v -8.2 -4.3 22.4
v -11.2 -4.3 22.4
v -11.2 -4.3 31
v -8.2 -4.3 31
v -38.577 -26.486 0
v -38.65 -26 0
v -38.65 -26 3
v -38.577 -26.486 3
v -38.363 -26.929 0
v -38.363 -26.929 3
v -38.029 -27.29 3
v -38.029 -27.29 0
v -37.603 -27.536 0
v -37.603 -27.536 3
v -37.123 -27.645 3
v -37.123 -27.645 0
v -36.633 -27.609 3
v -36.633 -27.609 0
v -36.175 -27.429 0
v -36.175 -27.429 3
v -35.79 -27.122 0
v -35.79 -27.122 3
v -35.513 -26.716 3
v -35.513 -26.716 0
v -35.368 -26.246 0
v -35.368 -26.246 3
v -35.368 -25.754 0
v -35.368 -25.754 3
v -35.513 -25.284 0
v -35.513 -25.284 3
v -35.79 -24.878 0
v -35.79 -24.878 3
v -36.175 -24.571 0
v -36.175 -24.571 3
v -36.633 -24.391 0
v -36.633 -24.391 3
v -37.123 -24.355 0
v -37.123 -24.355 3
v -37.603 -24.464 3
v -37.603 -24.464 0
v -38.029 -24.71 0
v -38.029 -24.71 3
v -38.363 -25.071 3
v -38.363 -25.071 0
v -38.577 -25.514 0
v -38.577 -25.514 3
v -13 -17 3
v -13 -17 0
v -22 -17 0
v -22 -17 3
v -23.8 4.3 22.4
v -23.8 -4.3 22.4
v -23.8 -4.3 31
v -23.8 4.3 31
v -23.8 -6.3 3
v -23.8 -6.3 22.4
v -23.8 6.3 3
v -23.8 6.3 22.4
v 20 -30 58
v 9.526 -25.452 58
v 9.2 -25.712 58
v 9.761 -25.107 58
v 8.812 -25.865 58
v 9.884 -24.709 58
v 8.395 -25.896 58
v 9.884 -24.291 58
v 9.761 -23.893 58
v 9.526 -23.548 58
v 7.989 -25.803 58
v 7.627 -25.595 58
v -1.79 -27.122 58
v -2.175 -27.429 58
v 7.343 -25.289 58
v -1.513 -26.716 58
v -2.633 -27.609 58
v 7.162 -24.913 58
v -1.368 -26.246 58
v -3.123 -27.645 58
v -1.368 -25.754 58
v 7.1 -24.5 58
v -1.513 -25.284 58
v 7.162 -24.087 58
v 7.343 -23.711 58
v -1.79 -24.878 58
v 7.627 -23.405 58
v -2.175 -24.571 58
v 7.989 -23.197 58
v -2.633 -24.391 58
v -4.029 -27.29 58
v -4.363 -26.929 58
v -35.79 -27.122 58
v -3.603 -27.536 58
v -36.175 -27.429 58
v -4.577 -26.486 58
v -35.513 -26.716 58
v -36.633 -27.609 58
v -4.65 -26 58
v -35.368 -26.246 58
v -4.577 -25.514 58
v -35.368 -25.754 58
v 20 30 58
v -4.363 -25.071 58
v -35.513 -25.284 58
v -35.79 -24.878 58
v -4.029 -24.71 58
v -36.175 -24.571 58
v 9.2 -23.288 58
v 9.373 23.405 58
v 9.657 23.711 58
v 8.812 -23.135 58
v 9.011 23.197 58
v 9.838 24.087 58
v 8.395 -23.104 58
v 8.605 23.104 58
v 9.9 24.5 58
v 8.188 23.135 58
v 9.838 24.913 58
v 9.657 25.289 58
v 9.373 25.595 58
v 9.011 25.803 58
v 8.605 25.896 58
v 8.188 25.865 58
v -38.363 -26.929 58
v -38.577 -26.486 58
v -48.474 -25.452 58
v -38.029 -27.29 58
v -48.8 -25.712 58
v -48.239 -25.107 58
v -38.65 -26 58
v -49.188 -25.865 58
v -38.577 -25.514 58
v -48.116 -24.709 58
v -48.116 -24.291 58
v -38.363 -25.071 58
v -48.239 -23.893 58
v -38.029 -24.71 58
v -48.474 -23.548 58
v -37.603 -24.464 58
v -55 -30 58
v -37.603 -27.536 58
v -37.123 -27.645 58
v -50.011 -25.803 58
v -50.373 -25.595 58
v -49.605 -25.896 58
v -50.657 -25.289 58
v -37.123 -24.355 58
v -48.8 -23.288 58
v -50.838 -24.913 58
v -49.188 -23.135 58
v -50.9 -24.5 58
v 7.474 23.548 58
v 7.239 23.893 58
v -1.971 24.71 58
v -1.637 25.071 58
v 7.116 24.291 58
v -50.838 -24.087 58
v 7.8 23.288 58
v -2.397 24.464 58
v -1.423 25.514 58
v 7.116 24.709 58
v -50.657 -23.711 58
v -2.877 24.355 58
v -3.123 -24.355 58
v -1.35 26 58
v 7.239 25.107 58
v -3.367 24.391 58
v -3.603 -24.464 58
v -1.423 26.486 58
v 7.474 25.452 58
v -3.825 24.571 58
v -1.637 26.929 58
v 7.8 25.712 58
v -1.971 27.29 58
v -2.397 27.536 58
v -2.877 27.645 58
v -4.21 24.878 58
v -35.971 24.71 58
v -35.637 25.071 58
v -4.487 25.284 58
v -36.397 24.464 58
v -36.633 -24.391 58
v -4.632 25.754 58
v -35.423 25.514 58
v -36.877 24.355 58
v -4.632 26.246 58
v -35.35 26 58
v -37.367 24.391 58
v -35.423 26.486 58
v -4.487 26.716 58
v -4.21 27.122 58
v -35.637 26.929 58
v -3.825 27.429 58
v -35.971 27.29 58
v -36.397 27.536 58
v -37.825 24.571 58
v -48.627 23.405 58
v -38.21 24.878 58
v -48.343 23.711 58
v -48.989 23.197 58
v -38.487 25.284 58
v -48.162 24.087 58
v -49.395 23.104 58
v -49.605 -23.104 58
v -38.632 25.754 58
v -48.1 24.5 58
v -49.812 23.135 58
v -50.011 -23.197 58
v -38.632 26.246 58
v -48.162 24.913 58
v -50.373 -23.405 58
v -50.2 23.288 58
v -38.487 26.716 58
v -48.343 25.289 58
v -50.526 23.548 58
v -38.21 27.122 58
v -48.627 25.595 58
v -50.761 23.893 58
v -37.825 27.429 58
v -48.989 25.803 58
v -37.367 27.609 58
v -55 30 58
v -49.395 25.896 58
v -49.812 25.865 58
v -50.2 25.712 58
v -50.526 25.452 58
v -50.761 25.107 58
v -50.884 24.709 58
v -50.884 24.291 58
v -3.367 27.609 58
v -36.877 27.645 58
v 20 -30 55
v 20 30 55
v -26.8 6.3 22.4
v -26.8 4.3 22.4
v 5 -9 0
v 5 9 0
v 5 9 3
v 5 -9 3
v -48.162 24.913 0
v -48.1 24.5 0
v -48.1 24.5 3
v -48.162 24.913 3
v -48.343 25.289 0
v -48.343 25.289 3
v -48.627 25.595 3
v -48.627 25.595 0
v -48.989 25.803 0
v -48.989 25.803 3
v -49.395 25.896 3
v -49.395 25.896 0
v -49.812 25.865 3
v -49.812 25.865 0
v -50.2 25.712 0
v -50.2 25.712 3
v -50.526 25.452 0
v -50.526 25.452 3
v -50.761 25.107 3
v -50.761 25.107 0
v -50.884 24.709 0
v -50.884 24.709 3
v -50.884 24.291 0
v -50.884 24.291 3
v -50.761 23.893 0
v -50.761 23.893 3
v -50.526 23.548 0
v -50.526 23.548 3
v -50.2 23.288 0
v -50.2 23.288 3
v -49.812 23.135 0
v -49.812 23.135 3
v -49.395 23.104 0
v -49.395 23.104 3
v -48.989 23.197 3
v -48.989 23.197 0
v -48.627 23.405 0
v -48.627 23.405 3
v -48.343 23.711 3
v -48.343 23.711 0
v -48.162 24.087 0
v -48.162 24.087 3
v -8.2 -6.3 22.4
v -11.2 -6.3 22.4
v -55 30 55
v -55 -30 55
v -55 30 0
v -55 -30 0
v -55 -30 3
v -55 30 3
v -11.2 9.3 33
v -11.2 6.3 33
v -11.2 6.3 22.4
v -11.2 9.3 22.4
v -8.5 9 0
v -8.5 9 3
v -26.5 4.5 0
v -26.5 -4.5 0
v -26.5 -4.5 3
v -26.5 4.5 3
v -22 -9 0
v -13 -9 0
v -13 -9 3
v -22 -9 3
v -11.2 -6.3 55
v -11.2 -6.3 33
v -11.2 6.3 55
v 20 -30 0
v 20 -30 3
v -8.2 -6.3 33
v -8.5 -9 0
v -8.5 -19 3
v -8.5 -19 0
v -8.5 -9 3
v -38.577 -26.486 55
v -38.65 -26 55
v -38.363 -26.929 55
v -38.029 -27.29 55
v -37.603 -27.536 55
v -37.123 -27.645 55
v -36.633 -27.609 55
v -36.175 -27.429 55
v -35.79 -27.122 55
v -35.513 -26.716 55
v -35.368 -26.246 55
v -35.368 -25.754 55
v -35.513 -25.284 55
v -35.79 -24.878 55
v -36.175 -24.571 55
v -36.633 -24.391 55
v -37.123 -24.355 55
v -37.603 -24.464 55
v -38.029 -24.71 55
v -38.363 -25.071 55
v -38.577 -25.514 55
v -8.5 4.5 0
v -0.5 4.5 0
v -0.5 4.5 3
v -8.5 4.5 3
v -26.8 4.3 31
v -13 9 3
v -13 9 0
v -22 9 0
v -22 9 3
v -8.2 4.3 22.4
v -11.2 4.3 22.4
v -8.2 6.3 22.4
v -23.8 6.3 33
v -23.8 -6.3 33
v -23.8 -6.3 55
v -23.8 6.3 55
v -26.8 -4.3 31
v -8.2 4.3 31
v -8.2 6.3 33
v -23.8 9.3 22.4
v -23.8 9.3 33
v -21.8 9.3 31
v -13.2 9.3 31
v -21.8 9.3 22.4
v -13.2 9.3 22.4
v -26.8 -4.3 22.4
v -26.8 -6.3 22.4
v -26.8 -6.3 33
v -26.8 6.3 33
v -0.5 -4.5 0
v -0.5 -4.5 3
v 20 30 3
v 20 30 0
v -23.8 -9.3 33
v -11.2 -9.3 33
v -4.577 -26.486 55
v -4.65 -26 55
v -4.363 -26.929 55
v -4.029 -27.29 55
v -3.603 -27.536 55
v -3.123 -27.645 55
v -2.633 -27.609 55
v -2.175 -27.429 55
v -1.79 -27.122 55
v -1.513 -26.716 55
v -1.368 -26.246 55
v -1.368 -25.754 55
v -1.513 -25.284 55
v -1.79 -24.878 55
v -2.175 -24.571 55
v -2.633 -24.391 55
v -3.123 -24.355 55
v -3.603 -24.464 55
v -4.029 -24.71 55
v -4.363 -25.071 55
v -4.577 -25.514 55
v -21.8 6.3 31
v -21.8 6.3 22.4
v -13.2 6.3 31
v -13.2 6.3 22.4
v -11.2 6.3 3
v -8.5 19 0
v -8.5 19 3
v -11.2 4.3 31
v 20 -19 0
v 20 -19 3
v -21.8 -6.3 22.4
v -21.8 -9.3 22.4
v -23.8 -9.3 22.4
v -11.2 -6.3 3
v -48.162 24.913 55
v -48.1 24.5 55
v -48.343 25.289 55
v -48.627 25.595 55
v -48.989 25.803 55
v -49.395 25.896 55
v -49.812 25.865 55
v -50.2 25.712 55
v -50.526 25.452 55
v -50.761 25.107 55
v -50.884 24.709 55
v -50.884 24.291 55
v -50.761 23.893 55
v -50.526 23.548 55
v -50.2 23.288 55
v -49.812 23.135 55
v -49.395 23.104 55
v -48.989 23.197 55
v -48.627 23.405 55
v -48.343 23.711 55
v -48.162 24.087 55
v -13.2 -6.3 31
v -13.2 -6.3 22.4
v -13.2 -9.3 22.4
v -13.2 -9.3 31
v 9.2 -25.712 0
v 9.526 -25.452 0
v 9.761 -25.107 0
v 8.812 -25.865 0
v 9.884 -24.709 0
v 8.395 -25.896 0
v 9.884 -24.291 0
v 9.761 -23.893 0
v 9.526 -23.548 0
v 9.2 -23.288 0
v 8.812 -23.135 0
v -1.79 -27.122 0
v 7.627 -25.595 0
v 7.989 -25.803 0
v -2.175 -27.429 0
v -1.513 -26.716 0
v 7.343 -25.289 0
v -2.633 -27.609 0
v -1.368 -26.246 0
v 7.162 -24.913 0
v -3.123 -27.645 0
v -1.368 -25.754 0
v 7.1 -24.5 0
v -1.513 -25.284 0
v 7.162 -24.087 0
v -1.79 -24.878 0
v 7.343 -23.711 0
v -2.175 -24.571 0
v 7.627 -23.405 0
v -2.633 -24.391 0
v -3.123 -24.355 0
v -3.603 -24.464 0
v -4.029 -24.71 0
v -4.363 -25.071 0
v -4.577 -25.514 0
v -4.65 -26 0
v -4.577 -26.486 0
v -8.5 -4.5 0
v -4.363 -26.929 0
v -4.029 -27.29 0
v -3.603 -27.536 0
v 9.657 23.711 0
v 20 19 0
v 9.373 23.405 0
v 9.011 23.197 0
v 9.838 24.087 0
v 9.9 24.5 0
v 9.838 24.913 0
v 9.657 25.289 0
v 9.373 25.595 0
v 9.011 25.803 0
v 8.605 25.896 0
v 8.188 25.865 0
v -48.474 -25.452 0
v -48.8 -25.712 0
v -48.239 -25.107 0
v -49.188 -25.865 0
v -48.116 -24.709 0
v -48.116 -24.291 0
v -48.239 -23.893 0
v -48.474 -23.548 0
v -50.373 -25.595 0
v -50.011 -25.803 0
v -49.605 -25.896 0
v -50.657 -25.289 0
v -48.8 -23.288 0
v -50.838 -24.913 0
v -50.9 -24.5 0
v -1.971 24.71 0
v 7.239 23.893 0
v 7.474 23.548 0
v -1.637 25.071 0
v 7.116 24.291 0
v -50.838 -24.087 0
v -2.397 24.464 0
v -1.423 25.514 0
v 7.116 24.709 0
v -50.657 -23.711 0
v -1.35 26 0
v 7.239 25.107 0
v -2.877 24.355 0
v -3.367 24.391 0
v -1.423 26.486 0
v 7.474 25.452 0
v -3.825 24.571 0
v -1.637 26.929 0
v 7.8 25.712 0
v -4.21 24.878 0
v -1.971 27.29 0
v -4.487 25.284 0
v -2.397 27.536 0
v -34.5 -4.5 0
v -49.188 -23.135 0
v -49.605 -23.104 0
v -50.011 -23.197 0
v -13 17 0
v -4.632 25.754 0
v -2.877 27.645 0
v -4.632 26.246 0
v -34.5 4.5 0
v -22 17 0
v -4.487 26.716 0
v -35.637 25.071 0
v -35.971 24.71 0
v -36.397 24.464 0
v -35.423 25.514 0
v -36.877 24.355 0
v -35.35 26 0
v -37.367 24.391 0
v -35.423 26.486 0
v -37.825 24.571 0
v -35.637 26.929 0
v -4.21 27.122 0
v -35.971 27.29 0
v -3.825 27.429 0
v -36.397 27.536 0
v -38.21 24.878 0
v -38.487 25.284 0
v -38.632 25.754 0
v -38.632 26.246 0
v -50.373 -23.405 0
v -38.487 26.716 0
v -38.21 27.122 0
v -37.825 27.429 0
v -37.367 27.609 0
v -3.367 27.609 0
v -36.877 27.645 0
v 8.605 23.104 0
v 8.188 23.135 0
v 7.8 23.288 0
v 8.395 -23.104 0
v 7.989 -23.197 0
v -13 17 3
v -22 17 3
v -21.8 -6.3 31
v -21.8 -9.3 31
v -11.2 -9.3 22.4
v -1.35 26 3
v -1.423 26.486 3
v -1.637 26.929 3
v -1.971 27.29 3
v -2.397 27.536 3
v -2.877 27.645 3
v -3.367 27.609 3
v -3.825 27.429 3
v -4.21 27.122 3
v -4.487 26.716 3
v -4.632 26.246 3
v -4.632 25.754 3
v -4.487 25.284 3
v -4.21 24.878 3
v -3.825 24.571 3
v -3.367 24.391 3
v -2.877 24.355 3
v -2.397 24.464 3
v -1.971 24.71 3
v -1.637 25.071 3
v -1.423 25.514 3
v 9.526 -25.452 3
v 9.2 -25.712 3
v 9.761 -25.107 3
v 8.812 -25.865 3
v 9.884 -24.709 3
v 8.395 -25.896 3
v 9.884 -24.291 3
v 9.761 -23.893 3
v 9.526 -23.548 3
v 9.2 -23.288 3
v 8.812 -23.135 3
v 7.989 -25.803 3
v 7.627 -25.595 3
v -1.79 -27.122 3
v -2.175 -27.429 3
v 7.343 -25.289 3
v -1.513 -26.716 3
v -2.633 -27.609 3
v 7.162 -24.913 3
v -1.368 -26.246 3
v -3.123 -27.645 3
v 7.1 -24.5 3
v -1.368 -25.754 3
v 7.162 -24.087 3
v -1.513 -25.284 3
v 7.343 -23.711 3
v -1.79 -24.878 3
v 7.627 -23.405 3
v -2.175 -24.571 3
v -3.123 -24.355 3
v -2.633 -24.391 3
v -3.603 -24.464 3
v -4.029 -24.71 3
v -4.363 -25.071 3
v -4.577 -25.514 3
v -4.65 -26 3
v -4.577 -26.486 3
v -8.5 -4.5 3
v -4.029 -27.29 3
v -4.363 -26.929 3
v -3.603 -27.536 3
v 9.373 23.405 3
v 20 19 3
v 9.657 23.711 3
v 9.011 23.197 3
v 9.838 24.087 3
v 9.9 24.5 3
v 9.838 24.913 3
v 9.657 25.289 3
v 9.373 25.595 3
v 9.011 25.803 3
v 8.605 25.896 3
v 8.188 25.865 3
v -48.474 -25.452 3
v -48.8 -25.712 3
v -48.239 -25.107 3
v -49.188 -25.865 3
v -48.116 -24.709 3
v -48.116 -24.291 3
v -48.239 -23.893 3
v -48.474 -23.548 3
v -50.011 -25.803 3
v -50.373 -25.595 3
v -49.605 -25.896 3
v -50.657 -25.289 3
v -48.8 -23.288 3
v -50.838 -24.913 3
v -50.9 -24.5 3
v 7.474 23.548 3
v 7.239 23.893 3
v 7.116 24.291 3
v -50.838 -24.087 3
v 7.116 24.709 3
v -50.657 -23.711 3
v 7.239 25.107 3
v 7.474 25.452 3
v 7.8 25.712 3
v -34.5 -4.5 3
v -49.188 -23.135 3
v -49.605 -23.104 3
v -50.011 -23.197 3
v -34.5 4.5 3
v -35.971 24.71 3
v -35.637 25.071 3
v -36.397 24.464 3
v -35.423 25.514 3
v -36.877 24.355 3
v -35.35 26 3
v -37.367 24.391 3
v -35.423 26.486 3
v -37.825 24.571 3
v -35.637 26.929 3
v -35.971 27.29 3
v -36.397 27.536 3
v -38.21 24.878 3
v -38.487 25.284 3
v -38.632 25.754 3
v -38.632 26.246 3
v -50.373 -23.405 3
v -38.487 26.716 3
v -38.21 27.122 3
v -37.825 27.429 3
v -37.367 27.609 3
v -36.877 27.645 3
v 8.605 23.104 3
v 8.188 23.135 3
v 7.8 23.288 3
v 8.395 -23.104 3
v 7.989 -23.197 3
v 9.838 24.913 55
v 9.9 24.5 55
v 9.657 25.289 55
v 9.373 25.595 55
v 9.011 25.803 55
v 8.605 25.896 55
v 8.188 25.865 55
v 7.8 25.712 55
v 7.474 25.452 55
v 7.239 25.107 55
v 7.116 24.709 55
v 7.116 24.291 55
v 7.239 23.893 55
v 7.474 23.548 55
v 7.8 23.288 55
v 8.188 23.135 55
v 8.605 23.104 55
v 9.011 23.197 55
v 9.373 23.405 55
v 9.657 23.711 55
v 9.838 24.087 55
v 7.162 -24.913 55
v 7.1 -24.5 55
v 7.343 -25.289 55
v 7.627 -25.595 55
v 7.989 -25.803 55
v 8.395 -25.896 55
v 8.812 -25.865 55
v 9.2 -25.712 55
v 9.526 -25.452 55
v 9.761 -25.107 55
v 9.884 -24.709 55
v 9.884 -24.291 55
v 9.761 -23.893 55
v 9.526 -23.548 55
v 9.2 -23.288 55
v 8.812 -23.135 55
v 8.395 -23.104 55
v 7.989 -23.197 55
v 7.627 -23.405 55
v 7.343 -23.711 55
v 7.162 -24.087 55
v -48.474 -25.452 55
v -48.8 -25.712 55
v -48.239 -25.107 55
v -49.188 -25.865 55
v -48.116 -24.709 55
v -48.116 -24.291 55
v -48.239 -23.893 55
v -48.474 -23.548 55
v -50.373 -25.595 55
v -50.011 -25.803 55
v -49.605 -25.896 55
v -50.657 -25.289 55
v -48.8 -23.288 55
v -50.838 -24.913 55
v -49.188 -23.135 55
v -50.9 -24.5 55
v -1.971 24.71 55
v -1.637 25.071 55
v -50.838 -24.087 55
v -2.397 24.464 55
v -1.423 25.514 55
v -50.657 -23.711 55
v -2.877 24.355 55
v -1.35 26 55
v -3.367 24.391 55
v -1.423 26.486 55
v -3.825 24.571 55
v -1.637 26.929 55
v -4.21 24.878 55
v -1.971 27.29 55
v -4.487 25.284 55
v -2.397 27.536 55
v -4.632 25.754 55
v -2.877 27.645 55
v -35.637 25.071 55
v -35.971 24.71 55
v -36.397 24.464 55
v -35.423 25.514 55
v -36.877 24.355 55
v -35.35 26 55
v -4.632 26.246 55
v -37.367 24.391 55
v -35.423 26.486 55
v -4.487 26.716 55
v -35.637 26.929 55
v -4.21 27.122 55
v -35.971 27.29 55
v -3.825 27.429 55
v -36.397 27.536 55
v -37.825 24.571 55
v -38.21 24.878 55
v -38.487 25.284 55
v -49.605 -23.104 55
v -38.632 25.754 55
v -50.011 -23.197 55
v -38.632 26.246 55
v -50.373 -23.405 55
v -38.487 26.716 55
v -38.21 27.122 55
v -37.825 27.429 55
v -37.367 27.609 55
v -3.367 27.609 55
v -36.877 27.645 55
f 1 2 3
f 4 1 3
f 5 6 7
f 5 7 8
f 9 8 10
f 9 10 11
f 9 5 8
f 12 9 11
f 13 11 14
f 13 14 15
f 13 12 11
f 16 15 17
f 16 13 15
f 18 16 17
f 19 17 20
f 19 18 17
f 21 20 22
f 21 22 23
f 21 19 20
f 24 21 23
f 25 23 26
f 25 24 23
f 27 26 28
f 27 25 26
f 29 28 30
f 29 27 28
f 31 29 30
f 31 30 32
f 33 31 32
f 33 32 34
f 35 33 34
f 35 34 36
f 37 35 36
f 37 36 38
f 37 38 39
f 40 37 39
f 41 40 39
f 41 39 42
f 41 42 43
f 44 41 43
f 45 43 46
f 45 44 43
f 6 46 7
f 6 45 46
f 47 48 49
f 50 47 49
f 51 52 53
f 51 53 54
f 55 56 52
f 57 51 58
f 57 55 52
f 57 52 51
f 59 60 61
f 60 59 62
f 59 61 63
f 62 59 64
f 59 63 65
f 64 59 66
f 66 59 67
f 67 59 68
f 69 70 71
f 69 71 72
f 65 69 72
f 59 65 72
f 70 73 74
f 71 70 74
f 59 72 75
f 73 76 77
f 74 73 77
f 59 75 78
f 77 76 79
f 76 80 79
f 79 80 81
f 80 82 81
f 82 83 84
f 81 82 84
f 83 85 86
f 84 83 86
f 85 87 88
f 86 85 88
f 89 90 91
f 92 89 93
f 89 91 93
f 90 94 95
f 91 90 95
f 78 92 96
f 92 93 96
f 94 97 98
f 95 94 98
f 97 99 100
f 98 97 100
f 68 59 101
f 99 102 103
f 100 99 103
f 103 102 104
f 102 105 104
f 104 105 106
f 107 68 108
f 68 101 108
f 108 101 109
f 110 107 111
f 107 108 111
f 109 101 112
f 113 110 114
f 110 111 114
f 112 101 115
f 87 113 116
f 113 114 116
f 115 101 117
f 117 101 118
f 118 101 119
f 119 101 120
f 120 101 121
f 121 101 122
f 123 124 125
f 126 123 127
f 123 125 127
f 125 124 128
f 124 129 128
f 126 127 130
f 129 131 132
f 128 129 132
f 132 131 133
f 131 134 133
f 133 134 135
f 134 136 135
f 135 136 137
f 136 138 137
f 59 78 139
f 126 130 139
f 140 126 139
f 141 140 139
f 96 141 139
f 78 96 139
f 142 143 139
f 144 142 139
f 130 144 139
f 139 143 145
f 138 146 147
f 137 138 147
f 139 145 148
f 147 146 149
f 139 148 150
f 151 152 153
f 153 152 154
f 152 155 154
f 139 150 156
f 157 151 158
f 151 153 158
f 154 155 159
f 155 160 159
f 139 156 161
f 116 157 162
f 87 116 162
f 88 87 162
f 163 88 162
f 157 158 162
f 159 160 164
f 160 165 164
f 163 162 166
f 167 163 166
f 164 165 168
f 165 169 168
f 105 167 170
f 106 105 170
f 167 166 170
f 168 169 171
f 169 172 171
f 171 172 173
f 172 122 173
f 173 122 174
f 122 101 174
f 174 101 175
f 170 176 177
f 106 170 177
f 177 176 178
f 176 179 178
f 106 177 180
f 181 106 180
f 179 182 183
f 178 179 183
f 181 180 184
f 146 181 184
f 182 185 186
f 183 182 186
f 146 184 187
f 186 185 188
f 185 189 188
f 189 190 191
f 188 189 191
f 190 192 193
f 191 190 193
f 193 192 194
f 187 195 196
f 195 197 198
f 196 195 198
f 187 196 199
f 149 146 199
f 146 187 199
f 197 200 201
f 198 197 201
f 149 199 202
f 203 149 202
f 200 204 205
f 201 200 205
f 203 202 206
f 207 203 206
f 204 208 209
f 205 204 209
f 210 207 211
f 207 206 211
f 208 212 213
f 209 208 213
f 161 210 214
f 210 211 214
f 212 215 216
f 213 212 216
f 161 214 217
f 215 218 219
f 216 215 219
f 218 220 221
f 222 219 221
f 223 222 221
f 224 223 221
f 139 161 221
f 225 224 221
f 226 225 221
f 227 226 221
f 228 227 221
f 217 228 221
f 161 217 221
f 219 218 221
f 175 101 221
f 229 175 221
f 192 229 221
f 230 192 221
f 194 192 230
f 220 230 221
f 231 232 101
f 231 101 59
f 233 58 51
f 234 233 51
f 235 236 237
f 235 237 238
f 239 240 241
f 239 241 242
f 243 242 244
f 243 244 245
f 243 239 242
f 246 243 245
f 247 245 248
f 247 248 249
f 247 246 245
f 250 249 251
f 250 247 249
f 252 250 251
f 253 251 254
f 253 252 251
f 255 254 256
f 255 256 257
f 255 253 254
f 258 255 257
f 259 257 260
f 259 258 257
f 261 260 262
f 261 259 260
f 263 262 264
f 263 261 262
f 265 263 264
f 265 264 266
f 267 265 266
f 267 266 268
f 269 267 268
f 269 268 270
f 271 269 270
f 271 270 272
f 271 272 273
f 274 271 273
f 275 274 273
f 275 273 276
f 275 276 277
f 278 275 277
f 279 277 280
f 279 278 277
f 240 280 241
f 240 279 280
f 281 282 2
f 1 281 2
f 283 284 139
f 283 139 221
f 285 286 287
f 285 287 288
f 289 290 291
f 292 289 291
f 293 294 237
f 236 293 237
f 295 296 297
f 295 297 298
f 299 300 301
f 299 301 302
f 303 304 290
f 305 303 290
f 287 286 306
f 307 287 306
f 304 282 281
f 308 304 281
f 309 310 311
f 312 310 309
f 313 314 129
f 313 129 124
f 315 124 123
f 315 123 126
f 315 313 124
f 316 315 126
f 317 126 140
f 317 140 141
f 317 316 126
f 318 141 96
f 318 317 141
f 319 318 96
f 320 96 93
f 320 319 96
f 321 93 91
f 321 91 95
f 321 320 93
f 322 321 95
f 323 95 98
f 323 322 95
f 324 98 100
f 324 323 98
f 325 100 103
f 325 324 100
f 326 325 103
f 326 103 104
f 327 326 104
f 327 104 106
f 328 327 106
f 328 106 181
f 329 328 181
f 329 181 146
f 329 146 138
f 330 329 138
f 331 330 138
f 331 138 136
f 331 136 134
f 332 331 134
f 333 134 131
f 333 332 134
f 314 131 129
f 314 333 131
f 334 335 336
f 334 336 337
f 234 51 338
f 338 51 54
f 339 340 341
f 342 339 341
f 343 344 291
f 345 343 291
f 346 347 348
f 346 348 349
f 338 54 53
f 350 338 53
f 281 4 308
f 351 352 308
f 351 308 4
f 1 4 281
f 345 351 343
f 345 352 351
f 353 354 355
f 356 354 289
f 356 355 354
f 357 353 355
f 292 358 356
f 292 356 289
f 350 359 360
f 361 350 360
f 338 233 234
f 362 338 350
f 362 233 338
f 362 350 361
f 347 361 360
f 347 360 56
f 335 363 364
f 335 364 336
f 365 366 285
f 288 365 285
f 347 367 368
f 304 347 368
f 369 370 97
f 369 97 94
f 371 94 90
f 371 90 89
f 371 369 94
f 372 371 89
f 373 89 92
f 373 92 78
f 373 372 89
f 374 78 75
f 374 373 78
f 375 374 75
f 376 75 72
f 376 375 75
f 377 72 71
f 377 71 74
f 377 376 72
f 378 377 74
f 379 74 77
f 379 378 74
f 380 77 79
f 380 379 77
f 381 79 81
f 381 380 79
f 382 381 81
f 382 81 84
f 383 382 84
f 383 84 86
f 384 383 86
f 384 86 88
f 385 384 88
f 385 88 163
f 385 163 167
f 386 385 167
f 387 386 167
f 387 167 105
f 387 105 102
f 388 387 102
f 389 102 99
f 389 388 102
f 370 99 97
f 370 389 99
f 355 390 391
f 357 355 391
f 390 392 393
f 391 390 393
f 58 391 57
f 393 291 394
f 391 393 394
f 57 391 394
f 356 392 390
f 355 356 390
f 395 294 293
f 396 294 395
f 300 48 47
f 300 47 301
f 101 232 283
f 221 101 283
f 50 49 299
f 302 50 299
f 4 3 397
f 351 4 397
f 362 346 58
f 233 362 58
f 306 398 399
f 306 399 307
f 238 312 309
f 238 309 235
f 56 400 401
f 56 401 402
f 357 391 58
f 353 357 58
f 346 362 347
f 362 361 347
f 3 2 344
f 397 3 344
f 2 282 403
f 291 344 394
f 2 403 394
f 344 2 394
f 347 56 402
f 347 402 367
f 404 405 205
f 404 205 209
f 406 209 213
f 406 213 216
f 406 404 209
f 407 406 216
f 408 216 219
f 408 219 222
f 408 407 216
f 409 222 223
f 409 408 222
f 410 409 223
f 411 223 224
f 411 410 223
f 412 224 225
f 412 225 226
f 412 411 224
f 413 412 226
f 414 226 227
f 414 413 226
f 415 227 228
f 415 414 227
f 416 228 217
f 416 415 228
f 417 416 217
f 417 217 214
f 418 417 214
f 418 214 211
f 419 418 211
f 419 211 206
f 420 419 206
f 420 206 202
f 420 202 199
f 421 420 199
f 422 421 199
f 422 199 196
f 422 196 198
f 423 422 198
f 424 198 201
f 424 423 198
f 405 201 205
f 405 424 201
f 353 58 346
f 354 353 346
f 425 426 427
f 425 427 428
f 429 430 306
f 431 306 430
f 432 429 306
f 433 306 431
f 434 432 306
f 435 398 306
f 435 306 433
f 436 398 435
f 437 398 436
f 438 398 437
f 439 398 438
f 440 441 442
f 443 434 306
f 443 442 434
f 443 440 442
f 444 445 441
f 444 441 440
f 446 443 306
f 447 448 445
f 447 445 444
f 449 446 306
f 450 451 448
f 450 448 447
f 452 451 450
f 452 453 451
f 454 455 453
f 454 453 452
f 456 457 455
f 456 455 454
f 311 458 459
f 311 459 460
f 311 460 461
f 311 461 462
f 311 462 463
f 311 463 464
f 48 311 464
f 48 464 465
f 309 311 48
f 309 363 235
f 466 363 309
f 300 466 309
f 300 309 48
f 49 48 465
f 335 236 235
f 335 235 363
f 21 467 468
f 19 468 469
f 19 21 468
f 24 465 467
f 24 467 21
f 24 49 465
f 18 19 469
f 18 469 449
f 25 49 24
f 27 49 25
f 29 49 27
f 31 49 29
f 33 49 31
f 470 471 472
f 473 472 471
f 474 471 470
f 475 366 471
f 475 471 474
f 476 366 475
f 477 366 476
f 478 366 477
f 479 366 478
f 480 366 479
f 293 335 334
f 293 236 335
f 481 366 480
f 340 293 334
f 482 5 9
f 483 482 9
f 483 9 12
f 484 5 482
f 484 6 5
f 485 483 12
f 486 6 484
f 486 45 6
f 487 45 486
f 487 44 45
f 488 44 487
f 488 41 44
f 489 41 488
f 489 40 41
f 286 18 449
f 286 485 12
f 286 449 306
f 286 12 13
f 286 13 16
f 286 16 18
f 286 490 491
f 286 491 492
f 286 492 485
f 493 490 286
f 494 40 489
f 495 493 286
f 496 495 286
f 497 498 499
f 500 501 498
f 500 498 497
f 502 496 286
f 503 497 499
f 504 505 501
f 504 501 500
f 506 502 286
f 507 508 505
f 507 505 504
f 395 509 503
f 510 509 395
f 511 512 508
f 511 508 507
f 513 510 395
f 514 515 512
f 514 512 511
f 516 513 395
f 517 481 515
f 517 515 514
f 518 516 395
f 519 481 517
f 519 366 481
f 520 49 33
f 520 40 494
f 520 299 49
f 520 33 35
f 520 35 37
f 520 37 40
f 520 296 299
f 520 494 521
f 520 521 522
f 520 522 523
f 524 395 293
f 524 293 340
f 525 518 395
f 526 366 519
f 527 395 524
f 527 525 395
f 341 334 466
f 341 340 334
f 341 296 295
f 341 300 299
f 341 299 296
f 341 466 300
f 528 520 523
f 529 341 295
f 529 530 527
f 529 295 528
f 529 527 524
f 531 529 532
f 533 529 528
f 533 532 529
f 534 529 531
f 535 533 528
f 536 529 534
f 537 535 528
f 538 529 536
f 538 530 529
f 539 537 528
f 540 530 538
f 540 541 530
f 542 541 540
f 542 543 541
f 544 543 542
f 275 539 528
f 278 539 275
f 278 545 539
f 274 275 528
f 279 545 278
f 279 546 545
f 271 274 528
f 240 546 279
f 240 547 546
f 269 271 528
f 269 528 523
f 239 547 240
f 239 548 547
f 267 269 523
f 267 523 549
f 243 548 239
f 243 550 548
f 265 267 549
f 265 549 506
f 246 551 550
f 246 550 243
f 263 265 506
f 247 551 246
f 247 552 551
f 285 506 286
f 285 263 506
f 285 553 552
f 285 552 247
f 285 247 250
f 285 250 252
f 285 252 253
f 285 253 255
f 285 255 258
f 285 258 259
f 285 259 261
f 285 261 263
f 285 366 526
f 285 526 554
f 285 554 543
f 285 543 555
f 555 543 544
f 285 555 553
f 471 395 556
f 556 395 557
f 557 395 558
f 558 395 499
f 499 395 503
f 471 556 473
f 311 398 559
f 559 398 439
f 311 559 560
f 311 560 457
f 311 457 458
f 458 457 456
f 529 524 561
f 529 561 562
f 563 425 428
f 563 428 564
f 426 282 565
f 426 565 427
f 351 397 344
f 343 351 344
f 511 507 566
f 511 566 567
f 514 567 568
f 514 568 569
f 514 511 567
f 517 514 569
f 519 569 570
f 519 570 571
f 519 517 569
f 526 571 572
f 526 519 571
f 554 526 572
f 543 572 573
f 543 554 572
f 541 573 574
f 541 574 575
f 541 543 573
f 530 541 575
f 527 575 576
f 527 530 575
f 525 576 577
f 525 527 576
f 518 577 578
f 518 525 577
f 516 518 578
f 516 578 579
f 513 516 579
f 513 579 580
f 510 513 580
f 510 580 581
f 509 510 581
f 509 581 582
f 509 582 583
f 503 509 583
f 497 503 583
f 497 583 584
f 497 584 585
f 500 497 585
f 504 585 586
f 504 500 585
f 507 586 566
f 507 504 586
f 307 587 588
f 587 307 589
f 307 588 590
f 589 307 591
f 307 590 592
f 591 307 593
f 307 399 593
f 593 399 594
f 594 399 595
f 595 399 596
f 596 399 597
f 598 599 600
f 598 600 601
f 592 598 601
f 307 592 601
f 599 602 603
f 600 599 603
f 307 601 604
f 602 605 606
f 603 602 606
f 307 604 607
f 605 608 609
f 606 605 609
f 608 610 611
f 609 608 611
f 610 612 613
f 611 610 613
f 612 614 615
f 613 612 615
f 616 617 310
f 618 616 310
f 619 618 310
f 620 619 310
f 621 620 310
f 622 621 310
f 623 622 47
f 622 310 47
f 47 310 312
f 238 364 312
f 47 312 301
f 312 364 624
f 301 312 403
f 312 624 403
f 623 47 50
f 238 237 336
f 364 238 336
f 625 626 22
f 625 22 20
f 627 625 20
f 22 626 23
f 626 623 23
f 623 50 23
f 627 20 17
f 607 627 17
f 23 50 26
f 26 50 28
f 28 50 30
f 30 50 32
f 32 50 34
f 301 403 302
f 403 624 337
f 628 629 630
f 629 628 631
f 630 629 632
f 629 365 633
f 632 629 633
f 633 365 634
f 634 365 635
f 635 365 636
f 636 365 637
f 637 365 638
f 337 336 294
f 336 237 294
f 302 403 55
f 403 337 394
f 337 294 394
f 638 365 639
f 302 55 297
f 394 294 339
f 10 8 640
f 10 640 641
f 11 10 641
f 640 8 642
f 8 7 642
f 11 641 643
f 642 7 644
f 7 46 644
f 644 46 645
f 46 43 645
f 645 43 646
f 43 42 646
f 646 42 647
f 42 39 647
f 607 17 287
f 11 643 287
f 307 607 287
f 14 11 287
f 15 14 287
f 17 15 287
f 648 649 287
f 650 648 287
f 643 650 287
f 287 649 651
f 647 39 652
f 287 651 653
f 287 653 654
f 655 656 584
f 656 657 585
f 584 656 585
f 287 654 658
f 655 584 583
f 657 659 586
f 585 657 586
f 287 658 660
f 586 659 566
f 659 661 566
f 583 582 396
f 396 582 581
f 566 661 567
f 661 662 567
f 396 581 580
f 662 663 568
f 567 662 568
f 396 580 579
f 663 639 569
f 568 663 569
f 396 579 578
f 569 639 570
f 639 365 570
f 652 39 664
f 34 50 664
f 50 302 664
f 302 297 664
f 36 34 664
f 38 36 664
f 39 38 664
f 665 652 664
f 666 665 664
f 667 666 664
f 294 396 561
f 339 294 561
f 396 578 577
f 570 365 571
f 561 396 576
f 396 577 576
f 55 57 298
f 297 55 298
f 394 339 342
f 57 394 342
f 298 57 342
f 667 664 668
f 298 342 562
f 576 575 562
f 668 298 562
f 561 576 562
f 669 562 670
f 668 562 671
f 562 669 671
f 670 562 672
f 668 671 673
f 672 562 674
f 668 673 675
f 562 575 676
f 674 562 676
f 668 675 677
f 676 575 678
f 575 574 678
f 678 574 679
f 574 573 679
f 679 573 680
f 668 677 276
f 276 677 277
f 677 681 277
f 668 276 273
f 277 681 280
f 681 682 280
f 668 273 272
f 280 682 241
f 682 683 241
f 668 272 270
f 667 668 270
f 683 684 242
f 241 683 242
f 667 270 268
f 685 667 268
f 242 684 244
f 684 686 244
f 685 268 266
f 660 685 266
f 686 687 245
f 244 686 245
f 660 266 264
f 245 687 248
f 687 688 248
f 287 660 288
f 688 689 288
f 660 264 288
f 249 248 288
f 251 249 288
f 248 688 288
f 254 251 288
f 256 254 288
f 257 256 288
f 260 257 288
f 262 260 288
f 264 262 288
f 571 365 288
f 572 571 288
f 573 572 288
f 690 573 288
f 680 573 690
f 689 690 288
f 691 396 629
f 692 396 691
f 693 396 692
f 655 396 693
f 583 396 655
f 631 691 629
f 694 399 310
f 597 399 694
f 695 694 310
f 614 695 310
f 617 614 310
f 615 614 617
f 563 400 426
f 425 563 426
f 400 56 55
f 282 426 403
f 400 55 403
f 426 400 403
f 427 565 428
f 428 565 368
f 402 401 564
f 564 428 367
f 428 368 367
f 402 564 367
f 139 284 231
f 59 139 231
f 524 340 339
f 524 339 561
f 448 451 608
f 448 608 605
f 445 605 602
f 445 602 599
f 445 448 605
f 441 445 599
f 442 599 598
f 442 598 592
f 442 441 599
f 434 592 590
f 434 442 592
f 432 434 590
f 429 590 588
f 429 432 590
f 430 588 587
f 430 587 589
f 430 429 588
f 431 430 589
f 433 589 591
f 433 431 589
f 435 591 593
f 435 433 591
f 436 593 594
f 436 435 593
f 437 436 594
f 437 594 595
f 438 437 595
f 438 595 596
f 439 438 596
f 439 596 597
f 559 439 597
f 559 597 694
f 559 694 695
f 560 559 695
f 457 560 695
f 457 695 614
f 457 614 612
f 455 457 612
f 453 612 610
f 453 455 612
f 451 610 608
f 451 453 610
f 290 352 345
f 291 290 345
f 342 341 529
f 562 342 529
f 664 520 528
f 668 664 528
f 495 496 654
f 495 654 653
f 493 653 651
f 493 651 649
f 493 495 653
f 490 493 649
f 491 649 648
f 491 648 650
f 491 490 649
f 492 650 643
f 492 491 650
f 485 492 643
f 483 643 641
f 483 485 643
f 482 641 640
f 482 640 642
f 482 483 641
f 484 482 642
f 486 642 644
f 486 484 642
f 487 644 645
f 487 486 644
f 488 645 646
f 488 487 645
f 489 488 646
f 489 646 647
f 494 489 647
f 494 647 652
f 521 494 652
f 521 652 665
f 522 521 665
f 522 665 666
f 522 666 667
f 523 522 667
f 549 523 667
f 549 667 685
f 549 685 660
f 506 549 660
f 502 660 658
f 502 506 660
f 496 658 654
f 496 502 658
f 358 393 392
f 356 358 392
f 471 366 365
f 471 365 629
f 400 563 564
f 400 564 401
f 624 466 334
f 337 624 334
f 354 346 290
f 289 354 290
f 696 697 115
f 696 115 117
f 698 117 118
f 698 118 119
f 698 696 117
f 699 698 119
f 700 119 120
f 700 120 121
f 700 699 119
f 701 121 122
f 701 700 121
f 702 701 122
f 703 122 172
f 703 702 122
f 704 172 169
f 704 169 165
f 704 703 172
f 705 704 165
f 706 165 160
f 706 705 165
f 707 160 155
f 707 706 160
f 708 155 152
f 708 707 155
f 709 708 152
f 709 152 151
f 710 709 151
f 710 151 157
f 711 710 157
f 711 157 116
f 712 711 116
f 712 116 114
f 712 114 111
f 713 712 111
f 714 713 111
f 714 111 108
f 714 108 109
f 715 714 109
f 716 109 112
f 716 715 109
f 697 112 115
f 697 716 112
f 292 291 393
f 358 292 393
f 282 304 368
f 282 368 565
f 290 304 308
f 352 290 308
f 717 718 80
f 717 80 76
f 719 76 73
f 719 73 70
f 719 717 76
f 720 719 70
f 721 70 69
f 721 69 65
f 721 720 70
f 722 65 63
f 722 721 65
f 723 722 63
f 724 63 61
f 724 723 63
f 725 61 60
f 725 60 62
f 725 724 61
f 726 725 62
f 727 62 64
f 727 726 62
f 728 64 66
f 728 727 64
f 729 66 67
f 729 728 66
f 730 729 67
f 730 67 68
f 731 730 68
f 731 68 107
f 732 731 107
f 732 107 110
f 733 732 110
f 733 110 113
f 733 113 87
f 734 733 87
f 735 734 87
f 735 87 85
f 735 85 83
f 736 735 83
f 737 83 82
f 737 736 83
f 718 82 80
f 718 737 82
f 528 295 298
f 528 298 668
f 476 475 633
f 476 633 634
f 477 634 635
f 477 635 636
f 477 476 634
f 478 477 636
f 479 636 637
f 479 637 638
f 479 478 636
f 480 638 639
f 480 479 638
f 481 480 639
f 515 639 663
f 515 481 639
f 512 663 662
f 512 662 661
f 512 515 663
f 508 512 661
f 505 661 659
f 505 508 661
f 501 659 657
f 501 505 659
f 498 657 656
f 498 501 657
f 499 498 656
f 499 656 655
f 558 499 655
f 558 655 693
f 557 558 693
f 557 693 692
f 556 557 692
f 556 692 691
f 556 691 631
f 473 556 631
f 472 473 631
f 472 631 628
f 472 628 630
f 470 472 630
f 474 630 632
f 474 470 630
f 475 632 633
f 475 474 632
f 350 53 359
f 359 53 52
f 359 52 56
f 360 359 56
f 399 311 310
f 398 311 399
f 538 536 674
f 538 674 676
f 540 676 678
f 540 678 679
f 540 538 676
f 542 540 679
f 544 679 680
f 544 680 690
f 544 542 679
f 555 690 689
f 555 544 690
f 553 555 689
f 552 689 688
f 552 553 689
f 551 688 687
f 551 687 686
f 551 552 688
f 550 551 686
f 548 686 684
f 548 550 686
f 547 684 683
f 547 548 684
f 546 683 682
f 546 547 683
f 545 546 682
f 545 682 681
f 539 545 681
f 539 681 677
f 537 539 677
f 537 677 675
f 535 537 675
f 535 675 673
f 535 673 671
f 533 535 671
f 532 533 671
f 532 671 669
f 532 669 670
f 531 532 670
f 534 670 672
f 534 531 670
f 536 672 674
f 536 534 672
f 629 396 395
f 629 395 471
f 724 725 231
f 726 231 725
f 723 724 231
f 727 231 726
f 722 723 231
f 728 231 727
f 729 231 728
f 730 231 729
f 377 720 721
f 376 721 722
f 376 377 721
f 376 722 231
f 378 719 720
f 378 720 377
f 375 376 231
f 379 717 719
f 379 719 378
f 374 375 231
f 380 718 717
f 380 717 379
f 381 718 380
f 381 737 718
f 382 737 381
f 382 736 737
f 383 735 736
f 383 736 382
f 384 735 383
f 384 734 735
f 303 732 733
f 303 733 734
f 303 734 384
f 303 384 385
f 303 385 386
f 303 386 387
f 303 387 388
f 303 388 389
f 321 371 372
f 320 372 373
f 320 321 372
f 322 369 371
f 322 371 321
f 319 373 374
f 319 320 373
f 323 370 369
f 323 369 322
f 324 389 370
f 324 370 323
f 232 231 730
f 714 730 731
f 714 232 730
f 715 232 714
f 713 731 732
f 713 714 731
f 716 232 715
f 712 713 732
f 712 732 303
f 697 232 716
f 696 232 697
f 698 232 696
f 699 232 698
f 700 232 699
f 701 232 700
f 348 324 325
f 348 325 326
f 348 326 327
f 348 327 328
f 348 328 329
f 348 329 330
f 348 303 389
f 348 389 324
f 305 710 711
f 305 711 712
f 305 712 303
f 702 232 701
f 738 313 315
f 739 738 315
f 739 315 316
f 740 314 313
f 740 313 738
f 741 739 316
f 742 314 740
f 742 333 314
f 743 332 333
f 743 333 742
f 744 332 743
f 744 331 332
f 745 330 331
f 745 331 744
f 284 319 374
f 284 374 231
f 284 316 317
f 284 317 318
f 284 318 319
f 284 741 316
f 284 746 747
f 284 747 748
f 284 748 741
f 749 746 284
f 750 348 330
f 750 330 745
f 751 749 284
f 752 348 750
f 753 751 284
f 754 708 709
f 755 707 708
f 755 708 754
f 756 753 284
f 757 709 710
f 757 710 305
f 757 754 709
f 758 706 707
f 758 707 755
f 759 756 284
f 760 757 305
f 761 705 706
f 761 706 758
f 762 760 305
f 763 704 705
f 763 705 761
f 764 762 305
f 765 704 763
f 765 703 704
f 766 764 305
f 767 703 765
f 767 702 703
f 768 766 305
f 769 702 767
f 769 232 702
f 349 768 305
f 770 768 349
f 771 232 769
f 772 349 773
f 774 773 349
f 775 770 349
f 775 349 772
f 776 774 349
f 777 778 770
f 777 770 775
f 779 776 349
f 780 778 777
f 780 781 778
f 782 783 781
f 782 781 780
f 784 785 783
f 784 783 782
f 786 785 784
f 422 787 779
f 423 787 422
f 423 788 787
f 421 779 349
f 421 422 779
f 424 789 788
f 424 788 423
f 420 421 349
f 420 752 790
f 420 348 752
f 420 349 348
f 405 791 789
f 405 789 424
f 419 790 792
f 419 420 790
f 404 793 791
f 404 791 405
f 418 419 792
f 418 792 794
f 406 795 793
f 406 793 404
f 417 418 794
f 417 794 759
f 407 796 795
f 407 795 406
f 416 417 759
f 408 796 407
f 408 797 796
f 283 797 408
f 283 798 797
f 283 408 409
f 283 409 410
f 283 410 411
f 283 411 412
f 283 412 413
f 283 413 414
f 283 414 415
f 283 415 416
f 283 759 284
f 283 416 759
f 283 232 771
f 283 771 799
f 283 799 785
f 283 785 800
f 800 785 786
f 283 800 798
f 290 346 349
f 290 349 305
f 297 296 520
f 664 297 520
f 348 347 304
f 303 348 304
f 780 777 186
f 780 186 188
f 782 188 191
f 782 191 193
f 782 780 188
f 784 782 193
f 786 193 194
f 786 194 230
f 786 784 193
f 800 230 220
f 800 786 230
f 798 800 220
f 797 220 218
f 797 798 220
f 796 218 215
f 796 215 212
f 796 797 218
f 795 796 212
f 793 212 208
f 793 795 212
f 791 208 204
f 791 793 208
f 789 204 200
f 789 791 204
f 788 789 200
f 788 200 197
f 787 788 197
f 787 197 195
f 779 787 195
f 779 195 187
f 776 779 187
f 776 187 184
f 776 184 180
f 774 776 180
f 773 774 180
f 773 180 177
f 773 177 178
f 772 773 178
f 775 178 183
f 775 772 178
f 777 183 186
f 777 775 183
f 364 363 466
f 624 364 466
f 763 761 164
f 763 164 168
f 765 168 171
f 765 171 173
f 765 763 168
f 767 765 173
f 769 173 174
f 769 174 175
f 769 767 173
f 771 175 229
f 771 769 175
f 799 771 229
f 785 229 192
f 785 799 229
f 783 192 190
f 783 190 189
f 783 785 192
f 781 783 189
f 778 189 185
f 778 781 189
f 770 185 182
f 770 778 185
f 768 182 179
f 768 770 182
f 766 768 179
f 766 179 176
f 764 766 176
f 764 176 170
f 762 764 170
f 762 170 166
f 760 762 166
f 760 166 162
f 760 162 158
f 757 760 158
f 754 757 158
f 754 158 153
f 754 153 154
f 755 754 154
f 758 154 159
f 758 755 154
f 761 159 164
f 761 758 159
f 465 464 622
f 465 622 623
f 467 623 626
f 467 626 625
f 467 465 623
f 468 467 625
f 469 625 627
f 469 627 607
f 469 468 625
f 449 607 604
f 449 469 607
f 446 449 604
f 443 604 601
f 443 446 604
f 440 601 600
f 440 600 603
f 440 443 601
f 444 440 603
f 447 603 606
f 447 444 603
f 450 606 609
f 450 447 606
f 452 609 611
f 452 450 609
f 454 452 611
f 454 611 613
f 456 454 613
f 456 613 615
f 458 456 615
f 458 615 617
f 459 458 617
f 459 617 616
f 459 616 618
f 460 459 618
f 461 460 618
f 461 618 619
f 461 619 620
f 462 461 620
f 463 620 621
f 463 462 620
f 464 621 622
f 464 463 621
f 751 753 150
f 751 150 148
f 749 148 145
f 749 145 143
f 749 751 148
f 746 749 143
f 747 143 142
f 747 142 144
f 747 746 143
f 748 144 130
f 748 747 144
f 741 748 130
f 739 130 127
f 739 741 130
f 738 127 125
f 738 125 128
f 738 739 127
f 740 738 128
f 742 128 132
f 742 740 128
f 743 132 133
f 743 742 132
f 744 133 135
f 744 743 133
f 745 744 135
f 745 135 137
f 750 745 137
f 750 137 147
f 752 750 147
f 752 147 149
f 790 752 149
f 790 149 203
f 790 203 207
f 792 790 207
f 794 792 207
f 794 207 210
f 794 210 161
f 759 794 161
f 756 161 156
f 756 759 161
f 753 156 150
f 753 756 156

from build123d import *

# Parameters (mm, degrees)
SKETCH_4_R          = 1.4
SKETCH_4_R_2        = 1.65
EXTRUDE_1_DEPTH     = 3
SKETCH_5_W          = 12.6
SKETCH_5_H          = 12.6
EXTRUDE_2_DEPTH     = 30
SKETCH_6_W          = 9
SKETCH_6_H          = 8
SKETCH_6_W_2        = 8
SKETCH_6_H_2        = 9
CUT_EXTRUDE_2_DEPTH = 71.809603868
EXTRUDE_3_DEPTH     = 3
EXTRUDE_4_DEPTH     = 3
EXTRUDE_5_DEPTH     = 3
EXTRUDE_6_DEPTH     = 3
SKETCH_13_W         = 12.6
SKETCH_13_H         = 12.6
EXTRUDE_7_DEPTH     = 22
SKETCH_14_R         = 1.4
SKETCH_14_R_2       = 1.65
EXTRUDE_8_DEPTH     = 3
SKETCH_15_W         = 13.5
SKETCH_15_H         = 10
CUT_EXTRUDE_3_DEPTH = 84.366660003


with BuildPart() as part:
    # 草图4 → 凸台-拉伸1 (new body)
    with BuildSketch(Plane.XY):
        Polygon((-39, 30), (20, 30), (20, 19), (5, 19), (5, -19), (20, -19), (20, -30), (-39, -30), (-55, -30), (-55, 30), align=None)
        with Locations((-49.5, 24.5)):
            Circle(SKETCH_4_R, mode=Mode.SUBTRACT)
        with Locations((8.5, 24.5)):
            Circle(SKETCH_4_R, mode=Mode.SUBTRACT)
        with Locations((-3, 26)):
            Circle(SKETCH_4_R_2, mode=Mode.SUBTRACT)
        with Locations((-37, 26)):
            Circle(SKETCH_4_R_2, mode=Mode.SUBTRACT)
        with Locations(Location((-37, -26, 0), (0, 0, 180))):
            Circle(SKETCH_4_R_2, mode=Mode.SUBTRACT)
        with Locations(Location((-3, -26, 0), (0, 0, 180))):
            Circle(SKETCH_4_R_2, mode=Mode.SUBTRACT)
        with Locations(Location((8.5, -24.5, 0), (0, 0, 180))):
            Circle(SKETCH_4_R, mode=Mode.SUBTRACT)
        with Locations(Location((-49.5, -24.5, 0), (0, 0, 180))):
            Circle(SKETCH_4_R, mode=Mode.SUBTRACT)
    extrude(amount=EXTRUDE_1_DEPTH)

    # 草图5 → 凸台-拉伸2 (add)
    with BuildSketch(Plane.XY.offset(3)):
        with Locations((-17.5, 0)):
            Rectangle(SKETCH_5_W, SKETCH_5_H)
    extrude(amount=EXTRUDE_2_DEPTH)

    # 草图6 → 切除-拉伸2 (cut, through all)
    with BuildSketch(Plane(origin=(0, 0, 0), x_dir=(-1, 0, 0), z_dir=(0, 0, -1))):
        with Locations((17.5, 13)):
            Rectangle(SKETCH_6_W, SKETCH_6_H)
        with Locations((30.5, 0)):
            Rectangle(SKETCH_6_W_2, SKETCH_6_H_2)
        with Locations((17.5, -13)):
            Rectangle(SKETCH_6_W, SKETCH_6_H)
        with Locations((4.5, 0)):
            Rectangle(SKETCH_6_W_2, SKETCH_6_H_2)
    extrude(amount=-CUT_EXTRUDE_2_DEPTH, mode=Mode.SUBTRACT)

    # 草图8 → 凸台-拉伸3 (add)
    with BuildSketch(Plane(origin=(-11.2, 0, 0), x_dir=(0, 0, -1), z_dir=(1, 0, 0))):
        Polygon((-31, 4.3), (-22.4, 4.3), (-22.4, 6.3), (-33, 6.3), (-33, -6.3), (-22.4, -6.3), (-22.4, -4.3), (-31, -4.3), align=None)
    extrude(amount=EXTRUDE_3_DEPTH)

    # 草图10 → 凸台-拉伸4 (add)
    with BuildSketch(Plane.ZY.offset(23.8)):
        Polygon((22.4, 6.3), (22.4, 4.3), (31, 4.3), (31, -4.3), (22.4, -4.3), (22.4, -6.3), (33, -6.3), (33, 6.3), align=None)
    extrude(amount=EXTRUDE_4_DEPTH)

    # 草图11 → 凸台-拉伸5 (add)
    with BuildSketch(Plane.XZ.offset(6.3)):
        Polygon((-23.8, 22.4), (-23.8, 33), (-11.2, 33), (-11.2, 22.4), (-13.2, 22.4), (-13.2, 31), (-21.8, 31), (-21.8, 22.4), align=None)
    extrude(amount=EXTRUDE_5_DEPTH)

    # 草图12 → 凸台-拉伸6 (add)
    with BuildSketch(Plane(origin=(0, 6.3, 0), x_dir=(1, 0, 0), z_dir=(0, 1, 0))):
        Polygon((-23.8, -22.4), (-23.8, -33), (-11.2, -33), (-11.2, -22.4), (-13.2, -22.4), (-13.2, -31), (-21.8, -31), (-21.8, -22.4), align=None)
    extrude(amount=EXTRUDE_6_DEPTH)

    # 草图13 → 凸台-拉伸7 (add)
    with BuildSketch(Plane.XY.offset(33)):
        with Locations((-17.5, 0)):
            Rectangle(SKETCH_13_W, SKETCH_13_H)
    extrude(amount=EXTRUDE_7_DEPTH)

    # 草图14 → 凸台-拉伸8 (add)
    with BuildSketch(Plane.XY.offset(55)):
        Polygon((-39, 30), (20, 30), (20, -30), (-39, -30), (-55, -30), (-55, 30), align=None)
        with Locations((-49.5, 24.5)):
            Circle(SKETCH_14_R, mode=Mode.SUBTRACT)
        with Locations((8.5, 24.5)):
            Circle(SKETCH_14_R, mode=Mode.SUBTRACT)
        with Locations((-3, 26)):
            Circle(SKETCH_14_R_2, mode=Mode.SUBTRACT)
        with Locations((-37, 26)):
            Circle(SKETCH_14_R_2, mode=Mode.SUBTRACT)
        with Locations(Location((-37, -26, 0), (0, 0, 180))):
            Circle(SKETCH_14_R_2, mode=Mode.SUBTRACT)
        with Locations(Location((-3, -26, 0), (0, 0, 180))):
            Circle(SKETCH_14_R_2, mode=Mode.SUBTRACT)
        with Locations(Location((8.5, -24.5, 0), (0, 0, 180))):
            Circle(SKETCH_14_R, mode=Mode.SUBTRACT)
        with Locations(Location((-49.5, -24.5, 0), (0, 0, 180))):
            Circle(SKETCH_14_R, mode=Mode.SUBTRACT)
    extrude(amount=EXTRUDE_8_DEPTH)

    # 草图15 → 切除-拉伸3 (cut, through all)
    with BuildSketch(Plane.XY.offset(3)):
        with Locations((-1.75, 14)):
            Rectangle(SKETCH_15_W, SKETCH_15_H)
        with Locations((-1.75, -14)):
            Rectangle(SKETCH_15_W, SKETCH_15_H)
    extrude(amount=-CUT_EXTRUDE_3_DEPTH, mode=Mode.SUBTRACT)


solid = part.part
